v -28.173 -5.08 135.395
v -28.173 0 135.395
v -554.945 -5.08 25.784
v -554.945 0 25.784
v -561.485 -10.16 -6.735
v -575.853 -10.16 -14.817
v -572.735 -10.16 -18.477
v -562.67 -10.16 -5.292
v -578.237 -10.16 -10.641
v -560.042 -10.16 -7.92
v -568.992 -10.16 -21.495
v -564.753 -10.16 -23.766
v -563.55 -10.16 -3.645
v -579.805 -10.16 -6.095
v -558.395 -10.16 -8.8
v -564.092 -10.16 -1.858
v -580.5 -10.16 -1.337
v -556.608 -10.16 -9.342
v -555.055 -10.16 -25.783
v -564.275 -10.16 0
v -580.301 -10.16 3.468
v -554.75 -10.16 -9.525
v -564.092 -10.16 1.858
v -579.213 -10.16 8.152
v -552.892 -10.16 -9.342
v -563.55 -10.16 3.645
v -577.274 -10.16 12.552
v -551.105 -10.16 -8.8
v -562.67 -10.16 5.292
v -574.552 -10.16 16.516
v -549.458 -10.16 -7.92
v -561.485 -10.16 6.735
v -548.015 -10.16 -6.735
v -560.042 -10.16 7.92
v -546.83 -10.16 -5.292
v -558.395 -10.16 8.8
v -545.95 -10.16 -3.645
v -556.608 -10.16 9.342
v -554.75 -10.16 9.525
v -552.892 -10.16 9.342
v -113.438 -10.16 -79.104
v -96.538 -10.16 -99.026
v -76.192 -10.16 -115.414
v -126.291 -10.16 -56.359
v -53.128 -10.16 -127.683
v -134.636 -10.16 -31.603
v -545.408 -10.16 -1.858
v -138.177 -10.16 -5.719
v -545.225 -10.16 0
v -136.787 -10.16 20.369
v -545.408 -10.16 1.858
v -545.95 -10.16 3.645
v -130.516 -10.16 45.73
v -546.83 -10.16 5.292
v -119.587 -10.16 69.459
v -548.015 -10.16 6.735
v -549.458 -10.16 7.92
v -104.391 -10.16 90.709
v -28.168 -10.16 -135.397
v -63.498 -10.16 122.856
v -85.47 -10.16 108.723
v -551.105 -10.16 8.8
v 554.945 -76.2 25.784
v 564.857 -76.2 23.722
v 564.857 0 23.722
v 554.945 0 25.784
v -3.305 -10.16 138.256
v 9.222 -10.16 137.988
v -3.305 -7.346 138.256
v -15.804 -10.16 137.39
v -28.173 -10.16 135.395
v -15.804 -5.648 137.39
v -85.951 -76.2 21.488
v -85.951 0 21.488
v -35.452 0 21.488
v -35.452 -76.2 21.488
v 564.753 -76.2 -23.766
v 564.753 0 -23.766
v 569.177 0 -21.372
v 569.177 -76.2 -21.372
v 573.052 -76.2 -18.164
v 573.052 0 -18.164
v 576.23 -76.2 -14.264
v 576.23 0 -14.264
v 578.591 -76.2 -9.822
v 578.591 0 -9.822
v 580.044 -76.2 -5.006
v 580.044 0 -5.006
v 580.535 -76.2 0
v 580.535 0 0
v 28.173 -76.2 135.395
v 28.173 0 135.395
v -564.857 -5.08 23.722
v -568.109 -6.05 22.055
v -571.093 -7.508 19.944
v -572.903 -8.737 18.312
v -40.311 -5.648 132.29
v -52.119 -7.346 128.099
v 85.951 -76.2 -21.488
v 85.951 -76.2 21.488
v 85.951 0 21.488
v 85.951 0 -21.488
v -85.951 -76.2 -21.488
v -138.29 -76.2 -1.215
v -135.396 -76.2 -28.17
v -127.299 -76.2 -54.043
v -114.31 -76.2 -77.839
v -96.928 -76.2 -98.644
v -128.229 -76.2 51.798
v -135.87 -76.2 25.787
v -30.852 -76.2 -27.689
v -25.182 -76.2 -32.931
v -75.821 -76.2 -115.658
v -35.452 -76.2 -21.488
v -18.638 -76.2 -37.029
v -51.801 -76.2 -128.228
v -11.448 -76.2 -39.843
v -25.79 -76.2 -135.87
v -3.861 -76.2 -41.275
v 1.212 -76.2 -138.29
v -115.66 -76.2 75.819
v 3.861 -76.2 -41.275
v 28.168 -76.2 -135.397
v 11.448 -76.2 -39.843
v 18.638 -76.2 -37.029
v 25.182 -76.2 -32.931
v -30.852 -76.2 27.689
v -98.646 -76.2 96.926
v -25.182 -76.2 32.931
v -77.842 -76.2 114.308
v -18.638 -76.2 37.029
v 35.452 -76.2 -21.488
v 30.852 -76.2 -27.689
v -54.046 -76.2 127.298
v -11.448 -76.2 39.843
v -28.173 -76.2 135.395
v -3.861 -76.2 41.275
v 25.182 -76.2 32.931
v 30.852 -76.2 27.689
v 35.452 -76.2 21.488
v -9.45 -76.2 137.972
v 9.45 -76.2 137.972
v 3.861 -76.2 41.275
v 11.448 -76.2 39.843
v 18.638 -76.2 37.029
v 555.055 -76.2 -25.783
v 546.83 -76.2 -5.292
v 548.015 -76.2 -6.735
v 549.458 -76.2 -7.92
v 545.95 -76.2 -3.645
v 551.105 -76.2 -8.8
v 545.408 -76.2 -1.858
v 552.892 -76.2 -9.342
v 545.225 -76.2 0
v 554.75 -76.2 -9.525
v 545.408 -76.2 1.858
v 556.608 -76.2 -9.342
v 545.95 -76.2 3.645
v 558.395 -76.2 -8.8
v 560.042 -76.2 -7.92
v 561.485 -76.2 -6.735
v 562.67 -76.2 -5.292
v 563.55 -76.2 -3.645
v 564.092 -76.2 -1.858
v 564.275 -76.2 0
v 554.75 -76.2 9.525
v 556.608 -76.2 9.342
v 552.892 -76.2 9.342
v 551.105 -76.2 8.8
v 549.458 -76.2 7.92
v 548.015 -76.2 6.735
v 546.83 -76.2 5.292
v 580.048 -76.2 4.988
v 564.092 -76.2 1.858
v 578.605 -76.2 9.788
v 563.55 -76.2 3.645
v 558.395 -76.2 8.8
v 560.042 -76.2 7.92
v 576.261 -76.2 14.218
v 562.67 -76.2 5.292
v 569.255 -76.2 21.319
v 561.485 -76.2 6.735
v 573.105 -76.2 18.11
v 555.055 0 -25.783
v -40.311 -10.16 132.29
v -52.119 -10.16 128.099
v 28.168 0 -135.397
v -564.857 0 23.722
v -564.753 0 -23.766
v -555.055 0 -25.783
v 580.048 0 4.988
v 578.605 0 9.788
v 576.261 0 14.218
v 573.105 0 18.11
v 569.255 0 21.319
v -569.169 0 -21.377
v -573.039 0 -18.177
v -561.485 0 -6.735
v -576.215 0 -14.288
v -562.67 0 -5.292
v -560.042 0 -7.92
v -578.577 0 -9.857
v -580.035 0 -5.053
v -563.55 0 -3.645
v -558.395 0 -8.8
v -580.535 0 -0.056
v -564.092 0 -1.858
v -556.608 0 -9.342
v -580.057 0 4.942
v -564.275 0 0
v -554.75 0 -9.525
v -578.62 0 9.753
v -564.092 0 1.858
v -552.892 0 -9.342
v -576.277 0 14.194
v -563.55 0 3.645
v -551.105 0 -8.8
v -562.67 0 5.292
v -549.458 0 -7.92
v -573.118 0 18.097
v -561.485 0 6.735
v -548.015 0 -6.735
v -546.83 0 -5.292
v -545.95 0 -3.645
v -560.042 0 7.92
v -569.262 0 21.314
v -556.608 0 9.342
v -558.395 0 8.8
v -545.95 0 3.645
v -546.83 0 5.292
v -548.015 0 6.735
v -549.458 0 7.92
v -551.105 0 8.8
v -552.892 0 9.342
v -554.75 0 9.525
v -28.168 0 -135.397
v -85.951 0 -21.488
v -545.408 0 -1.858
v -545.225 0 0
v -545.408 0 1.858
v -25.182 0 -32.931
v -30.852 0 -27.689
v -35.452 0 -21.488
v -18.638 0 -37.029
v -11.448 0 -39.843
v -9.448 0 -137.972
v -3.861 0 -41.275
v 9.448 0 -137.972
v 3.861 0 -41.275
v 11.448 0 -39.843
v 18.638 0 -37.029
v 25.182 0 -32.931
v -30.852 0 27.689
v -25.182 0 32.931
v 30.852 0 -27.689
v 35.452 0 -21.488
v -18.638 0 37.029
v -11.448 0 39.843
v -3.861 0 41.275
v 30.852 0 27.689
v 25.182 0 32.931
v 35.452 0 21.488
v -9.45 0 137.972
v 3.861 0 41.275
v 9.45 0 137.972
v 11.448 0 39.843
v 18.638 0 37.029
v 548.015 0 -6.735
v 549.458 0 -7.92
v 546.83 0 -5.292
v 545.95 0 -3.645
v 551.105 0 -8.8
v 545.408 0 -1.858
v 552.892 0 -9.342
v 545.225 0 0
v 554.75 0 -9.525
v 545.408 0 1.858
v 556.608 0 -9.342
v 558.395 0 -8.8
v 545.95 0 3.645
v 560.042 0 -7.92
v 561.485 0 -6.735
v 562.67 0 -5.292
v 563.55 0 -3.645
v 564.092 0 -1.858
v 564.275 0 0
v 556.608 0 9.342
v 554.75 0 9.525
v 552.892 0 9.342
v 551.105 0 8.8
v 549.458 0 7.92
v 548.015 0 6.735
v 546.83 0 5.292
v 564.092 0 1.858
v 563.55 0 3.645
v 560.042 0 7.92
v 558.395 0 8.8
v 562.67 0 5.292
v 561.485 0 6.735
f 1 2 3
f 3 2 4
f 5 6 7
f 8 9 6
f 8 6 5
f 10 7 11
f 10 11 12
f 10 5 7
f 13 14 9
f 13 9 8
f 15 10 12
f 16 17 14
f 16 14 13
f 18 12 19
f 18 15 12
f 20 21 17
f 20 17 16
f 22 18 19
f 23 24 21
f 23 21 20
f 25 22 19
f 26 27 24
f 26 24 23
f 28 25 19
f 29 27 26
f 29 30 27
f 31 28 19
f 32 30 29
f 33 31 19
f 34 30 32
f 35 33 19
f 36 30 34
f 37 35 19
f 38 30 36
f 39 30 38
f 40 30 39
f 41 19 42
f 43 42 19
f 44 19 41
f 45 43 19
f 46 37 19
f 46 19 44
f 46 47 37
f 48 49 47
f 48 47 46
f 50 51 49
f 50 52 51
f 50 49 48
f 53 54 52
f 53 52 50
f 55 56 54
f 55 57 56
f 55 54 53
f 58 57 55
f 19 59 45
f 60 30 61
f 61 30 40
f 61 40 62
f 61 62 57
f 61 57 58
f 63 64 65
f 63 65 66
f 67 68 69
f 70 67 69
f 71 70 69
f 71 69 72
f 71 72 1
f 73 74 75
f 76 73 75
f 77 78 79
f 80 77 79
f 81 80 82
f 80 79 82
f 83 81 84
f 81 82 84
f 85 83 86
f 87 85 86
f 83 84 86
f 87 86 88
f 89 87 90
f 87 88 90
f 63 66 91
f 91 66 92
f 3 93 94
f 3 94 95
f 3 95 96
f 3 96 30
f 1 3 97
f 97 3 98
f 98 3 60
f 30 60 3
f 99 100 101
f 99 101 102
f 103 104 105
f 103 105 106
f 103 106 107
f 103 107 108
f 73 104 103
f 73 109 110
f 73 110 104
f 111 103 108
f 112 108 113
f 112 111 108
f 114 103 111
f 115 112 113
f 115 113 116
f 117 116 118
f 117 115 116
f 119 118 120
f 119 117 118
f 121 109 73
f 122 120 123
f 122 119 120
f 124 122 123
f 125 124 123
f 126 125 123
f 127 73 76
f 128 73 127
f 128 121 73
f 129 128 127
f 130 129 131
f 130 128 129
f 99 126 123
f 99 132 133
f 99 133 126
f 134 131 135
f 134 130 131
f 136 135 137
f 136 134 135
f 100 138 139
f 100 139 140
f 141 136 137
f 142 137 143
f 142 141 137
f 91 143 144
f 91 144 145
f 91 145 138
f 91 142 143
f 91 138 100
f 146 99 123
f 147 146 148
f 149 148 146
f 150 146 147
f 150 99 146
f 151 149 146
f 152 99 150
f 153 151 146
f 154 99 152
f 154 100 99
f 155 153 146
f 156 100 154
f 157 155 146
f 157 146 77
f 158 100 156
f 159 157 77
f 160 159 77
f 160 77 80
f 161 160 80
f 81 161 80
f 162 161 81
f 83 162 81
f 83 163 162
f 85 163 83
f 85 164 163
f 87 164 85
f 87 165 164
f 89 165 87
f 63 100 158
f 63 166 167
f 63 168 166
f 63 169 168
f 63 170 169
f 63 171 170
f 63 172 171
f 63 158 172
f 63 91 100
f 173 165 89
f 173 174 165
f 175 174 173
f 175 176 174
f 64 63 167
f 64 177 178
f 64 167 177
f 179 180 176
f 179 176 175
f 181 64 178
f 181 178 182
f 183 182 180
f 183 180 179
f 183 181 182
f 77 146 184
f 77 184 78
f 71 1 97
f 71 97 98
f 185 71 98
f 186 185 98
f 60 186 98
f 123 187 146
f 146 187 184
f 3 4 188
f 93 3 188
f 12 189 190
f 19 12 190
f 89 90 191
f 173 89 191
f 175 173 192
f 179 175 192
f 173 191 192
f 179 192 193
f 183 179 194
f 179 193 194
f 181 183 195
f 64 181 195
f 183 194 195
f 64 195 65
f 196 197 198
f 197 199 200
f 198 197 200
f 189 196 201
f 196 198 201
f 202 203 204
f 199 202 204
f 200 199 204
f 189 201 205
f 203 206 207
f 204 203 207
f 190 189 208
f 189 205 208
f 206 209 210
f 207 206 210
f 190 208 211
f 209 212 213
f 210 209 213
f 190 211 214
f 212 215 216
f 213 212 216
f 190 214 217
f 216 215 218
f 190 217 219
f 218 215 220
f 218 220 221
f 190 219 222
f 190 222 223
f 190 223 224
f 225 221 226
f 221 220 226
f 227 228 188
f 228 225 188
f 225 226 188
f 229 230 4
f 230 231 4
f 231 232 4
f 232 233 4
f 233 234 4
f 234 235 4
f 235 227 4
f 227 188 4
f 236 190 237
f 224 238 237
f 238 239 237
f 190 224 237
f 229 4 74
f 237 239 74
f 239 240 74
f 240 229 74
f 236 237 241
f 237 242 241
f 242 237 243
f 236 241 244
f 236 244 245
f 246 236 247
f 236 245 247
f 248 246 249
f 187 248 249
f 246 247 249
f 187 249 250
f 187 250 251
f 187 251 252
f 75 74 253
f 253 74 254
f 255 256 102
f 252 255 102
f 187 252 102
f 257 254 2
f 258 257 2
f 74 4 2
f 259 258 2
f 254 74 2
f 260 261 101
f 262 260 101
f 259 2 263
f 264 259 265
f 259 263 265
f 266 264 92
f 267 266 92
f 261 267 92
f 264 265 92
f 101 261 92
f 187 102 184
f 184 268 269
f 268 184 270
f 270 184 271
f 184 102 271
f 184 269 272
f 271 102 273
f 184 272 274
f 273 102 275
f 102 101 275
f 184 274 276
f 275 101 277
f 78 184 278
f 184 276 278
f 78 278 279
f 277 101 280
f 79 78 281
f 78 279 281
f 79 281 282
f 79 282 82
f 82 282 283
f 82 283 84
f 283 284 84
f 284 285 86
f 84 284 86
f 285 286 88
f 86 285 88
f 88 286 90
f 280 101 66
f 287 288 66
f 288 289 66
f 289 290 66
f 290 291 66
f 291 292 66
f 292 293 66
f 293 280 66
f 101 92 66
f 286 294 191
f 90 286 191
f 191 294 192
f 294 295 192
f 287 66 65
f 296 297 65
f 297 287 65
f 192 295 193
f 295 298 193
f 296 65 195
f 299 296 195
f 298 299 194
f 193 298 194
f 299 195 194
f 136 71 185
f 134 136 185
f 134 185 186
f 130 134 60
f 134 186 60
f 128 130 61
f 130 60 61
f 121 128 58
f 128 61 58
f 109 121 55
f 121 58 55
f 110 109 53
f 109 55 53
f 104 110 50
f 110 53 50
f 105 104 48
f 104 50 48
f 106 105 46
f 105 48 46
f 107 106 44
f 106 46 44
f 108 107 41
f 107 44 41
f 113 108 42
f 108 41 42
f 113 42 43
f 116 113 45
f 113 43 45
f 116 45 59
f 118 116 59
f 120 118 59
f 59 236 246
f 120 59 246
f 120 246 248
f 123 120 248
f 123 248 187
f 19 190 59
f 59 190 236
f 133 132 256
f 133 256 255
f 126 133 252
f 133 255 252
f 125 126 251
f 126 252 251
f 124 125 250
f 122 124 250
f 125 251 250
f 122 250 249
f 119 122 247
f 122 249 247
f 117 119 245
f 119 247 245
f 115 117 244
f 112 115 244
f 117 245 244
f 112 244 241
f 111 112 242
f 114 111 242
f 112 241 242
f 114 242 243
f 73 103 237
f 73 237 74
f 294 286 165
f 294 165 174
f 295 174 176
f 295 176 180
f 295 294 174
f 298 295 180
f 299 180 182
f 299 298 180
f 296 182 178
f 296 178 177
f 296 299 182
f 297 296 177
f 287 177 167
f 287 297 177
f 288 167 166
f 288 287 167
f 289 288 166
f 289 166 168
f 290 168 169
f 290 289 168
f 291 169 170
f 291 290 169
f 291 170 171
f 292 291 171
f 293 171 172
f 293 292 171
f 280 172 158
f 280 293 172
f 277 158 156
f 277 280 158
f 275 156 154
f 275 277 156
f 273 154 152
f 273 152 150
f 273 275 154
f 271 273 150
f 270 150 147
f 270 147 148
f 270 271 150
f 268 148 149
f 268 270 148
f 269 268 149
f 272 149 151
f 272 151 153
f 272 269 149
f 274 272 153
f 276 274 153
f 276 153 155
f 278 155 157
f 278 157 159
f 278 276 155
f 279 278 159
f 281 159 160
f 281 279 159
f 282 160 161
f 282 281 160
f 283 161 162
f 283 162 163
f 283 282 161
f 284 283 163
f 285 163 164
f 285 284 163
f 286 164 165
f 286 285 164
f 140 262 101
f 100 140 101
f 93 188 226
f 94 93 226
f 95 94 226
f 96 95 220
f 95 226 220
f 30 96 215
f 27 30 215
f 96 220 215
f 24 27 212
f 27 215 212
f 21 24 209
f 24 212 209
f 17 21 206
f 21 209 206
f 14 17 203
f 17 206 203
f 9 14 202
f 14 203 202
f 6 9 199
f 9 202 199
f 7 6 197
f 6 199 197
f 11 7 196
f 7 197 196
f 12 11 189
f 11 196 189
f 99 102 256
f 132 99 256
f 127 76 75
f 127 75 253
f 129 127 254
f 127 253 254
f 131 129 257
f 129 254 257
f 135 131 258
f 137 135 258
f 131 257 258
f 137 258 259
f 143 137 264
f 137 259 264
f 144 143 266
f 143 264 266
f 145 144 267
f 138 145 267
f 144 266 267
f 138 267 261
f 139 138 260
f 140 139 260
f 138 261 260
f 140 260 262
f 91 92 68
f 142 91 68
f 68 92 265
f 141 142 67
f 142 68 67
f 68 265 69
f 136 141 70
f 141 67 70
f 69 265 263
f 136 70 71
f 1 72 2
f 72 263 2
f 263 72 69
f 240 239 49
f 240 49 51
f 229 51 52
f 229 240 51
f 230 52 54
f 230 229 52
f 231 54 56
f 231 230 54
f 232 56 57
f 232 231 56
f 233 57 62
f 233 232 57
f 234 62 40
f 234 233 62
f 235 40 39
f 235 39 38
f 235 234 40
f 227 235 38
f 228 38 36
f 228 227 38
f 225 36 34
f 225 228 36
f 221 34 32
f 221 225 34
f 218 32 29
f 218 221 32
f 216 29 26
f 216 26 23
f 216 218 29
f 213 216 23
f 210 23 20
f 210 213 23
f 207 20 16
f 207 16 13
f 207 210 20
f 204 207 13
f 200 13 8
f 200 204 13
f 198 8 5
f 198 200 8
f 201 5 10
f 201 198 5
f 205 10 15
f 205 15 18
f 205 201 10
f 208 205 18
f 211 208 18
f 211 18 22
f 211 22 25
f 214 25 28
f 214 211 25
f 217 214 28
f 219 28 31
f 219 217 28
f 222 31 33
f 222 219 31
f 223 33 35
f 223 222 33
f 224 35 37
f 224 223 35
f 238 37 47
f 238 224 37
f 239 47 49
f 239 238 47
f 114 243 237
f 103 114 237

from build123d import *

# Parameters (mm, degrees)
F0_R        = 9.525
F1_DEPTH    = 76.2
F2_DEPTH    = 10.16
F3_T4_DEPTH = 600.435352042
F3_S5_R     = 138.2955463349
F3_T6_DEPTH = 303


# Not quite as in the source:
# - a fillet or chamfer that OpenCascade refuses, or shapes differently, is made with other operations: its cross-section is extruded or revolved along the edge and cut away or added


with BuildPart() as f1:
    # F0 (on Front) → F1 (new body)
    with BuildSketch(Plane.XZ):
        with BuildLine():
            ThreePointArc((28.1677821814, -135.396581135), (107.2873174282, -87.2644810626), (138.2955463349, 0))
            ThreePointArc((138.2955463349, 0), (107.2890589283, 87.2623399316), (28.1731863292, 135.3954567484))
            ThreePointArc((28.1731863292, 135.3954567484), (0, 138.2955463349), (-28.1731863292, 135.3954567484))
            ThreePointArc((-28.1731863292, 135.3954567484), (-138.2955463073, -0.0027599392), (-28.1677821814, -135.396581135))
            ThreePointArc((-28.1677821814, -135.396581135), (0, -138.2955463349), (28.1677821814, -135.396581135))
        make_face()
        with BuildLine():
            ThreePointArc((-35.4519361343, 21.4876397772), (0, 41.4554995009), (35.4519361343, 21.4876397772))
            Line((35.4519361343, 21.4876397772), (85.9505591086, 21.4876397772))
            Line((85.9505591086, 21.4876397772), (85.9505591086, -21.4876397772))
            Line((85.9505591086, -21.4876397772), (35.4519361343, -21.4876397772))
            ThreePointArc((35.4519361343, -21.4876397772), (0, -41.4554995009), (-35.4519361343, -21.4876397772))
            Line((-35.4519361343, -21.4876397772), (-85.9505591086, -21.4876397772))
            Line((-85.9505591086, -21.4876397772), (-85.9505591086, 21.4876397772))
            Line((-85.9505591086, 21.4876397772), (-35.4519361343, 21.4876397772))
        make_face(mode=Mode.SUBTRACT)
        with BuildLine():
            ThreePointArc((28.1731863292, 135.3954567484), (107.2890589283, 87.2623399316), (138.2955463349, 0))
            ThreePointArc((138.2955463349, 0), (107.2873174282, -87.2644810626), (28.1677821814, -135.396581135))
            Line((28.1677821814, -135.396581135), (555.0553956372, -25.7833589585))
            ThreePointArc((555.0553956372, -25.7833589585), (528.9648763124, -0.0553010475), (554.9447987454, 25.7844317855))
            Line((554.9447987454, 25.7844317855), (28.1731863292, 135.3954567484))
        make_face()
        with BuildLine():
            Line((564.856504828, 23.7219966861), (554.9447987454, 25.7844317855))
            ThreePointArc((554.9447987454, 25.7844317855), (528.9648763124, -0.0553010475), (555.0553956372, -25.7833589585))
            Line((555.0553956372, -25.7833589585), (564.7527625578, -23.7659275222))
            ThreePointArc((564.7527625578, -23.7659275222), (576.2301870088, -14.2644938792), (580.5351524758, 0))
            ThreePointArc((580.5351524758, 0), (576.2612979363, 14.2175342345), (564.856504828, 23.7219966861))
        make_face()
        with Locations((554.7499847432, 0)):
            Circle(F0_R, mode=Mode.SUBTRACT)
    extrude(amount=F1_DEPTH)

    # F0 (on Front) → F2 (join)
    with BuildSketch(Plane.XZ):
        with BuildLine():
            ThreePointArc((-28.1677821814, -135.396581135), (-138.2955463073, -0.0027599392), (-28.1731863292, 135.3954567484))
            Line((-28.1731863292, 135.3954567484), (-554.9447987454, 25.7844317855))
            ThreePointArc((-554.9447987454, 25.7844317855), (-536.5861255267, 18.3016145015), (-528.9648170106, 0))
            ThreePointArc((-528.9648170106, 0), (-536.6254184882, -18.3405281566), (-555.0553956372, -25.7833589585))
            Line((-555.0553956372, -25.7833589585), (-28.1677821814, -135.396581135))
        make_face()
        with BuildLine():
            ThreePointArc((-528.9648170106, 0), (-536.5861255267, 18.3016145015), (-554.9447987454, 25.7844317855))
            Line((-554.9447987454, 25.7844317855), (-564.856504828, 23.7219966861))
            ThreePointArc((-564.856504828, 23.7219966861), (-580.5350909463, -0.056330225), (-564.7527625578, -23.7659275222))
            Line((-564.7527625578, -23.7659275222), (-555.0553956372, -25.7833589585))
            ThreePointArc((-555.0553956372, -25.7833589585), (-536.6254184882, -18.3405281566), (-528.9648170106, 0))
        make_face()
        with Locations((-554.7499847432, 0)):
            Circle(F0_R, mode=Mode.SUBTRACT)
    extrude(amount=F2_DEPTH)

    # F3: chamfer of 5.08 on 1 edges, made by hand


with BuildPart() as f3_tool2:
    # F3_s3 → F3_t4 (new body)
    with BuildSketch(Plane(origin=(38.3705740236, 0, 7.9841772943), x_dir=(0, 1, 0), z_dir=(-0.9790297688, 0, -0.2037172351))):
        Polygon((-5.08, -138.2955463349), (-10.16, -133.2155463349), (-10.16, -138.2955463349), align=None)
    extrude(amount=F3_T4_DEPTH)

    # F3_s5 → F3_t6 (cut, symmetric)
    with BuildSketch(Plane.XZ.offset(7.6)):
        Circle(F3_S5_R)
    extrude(amount=F3_T6_DEPTH, both=True, mode=Mode.SUBTRACT)


with BuildPart() as f1_1:
    add(f1.part)

    # F3_t1: cut F3_tool2
    add(f3_tool2.part, mode=Mode.SUBTRACT)


solid = f1_1.part
